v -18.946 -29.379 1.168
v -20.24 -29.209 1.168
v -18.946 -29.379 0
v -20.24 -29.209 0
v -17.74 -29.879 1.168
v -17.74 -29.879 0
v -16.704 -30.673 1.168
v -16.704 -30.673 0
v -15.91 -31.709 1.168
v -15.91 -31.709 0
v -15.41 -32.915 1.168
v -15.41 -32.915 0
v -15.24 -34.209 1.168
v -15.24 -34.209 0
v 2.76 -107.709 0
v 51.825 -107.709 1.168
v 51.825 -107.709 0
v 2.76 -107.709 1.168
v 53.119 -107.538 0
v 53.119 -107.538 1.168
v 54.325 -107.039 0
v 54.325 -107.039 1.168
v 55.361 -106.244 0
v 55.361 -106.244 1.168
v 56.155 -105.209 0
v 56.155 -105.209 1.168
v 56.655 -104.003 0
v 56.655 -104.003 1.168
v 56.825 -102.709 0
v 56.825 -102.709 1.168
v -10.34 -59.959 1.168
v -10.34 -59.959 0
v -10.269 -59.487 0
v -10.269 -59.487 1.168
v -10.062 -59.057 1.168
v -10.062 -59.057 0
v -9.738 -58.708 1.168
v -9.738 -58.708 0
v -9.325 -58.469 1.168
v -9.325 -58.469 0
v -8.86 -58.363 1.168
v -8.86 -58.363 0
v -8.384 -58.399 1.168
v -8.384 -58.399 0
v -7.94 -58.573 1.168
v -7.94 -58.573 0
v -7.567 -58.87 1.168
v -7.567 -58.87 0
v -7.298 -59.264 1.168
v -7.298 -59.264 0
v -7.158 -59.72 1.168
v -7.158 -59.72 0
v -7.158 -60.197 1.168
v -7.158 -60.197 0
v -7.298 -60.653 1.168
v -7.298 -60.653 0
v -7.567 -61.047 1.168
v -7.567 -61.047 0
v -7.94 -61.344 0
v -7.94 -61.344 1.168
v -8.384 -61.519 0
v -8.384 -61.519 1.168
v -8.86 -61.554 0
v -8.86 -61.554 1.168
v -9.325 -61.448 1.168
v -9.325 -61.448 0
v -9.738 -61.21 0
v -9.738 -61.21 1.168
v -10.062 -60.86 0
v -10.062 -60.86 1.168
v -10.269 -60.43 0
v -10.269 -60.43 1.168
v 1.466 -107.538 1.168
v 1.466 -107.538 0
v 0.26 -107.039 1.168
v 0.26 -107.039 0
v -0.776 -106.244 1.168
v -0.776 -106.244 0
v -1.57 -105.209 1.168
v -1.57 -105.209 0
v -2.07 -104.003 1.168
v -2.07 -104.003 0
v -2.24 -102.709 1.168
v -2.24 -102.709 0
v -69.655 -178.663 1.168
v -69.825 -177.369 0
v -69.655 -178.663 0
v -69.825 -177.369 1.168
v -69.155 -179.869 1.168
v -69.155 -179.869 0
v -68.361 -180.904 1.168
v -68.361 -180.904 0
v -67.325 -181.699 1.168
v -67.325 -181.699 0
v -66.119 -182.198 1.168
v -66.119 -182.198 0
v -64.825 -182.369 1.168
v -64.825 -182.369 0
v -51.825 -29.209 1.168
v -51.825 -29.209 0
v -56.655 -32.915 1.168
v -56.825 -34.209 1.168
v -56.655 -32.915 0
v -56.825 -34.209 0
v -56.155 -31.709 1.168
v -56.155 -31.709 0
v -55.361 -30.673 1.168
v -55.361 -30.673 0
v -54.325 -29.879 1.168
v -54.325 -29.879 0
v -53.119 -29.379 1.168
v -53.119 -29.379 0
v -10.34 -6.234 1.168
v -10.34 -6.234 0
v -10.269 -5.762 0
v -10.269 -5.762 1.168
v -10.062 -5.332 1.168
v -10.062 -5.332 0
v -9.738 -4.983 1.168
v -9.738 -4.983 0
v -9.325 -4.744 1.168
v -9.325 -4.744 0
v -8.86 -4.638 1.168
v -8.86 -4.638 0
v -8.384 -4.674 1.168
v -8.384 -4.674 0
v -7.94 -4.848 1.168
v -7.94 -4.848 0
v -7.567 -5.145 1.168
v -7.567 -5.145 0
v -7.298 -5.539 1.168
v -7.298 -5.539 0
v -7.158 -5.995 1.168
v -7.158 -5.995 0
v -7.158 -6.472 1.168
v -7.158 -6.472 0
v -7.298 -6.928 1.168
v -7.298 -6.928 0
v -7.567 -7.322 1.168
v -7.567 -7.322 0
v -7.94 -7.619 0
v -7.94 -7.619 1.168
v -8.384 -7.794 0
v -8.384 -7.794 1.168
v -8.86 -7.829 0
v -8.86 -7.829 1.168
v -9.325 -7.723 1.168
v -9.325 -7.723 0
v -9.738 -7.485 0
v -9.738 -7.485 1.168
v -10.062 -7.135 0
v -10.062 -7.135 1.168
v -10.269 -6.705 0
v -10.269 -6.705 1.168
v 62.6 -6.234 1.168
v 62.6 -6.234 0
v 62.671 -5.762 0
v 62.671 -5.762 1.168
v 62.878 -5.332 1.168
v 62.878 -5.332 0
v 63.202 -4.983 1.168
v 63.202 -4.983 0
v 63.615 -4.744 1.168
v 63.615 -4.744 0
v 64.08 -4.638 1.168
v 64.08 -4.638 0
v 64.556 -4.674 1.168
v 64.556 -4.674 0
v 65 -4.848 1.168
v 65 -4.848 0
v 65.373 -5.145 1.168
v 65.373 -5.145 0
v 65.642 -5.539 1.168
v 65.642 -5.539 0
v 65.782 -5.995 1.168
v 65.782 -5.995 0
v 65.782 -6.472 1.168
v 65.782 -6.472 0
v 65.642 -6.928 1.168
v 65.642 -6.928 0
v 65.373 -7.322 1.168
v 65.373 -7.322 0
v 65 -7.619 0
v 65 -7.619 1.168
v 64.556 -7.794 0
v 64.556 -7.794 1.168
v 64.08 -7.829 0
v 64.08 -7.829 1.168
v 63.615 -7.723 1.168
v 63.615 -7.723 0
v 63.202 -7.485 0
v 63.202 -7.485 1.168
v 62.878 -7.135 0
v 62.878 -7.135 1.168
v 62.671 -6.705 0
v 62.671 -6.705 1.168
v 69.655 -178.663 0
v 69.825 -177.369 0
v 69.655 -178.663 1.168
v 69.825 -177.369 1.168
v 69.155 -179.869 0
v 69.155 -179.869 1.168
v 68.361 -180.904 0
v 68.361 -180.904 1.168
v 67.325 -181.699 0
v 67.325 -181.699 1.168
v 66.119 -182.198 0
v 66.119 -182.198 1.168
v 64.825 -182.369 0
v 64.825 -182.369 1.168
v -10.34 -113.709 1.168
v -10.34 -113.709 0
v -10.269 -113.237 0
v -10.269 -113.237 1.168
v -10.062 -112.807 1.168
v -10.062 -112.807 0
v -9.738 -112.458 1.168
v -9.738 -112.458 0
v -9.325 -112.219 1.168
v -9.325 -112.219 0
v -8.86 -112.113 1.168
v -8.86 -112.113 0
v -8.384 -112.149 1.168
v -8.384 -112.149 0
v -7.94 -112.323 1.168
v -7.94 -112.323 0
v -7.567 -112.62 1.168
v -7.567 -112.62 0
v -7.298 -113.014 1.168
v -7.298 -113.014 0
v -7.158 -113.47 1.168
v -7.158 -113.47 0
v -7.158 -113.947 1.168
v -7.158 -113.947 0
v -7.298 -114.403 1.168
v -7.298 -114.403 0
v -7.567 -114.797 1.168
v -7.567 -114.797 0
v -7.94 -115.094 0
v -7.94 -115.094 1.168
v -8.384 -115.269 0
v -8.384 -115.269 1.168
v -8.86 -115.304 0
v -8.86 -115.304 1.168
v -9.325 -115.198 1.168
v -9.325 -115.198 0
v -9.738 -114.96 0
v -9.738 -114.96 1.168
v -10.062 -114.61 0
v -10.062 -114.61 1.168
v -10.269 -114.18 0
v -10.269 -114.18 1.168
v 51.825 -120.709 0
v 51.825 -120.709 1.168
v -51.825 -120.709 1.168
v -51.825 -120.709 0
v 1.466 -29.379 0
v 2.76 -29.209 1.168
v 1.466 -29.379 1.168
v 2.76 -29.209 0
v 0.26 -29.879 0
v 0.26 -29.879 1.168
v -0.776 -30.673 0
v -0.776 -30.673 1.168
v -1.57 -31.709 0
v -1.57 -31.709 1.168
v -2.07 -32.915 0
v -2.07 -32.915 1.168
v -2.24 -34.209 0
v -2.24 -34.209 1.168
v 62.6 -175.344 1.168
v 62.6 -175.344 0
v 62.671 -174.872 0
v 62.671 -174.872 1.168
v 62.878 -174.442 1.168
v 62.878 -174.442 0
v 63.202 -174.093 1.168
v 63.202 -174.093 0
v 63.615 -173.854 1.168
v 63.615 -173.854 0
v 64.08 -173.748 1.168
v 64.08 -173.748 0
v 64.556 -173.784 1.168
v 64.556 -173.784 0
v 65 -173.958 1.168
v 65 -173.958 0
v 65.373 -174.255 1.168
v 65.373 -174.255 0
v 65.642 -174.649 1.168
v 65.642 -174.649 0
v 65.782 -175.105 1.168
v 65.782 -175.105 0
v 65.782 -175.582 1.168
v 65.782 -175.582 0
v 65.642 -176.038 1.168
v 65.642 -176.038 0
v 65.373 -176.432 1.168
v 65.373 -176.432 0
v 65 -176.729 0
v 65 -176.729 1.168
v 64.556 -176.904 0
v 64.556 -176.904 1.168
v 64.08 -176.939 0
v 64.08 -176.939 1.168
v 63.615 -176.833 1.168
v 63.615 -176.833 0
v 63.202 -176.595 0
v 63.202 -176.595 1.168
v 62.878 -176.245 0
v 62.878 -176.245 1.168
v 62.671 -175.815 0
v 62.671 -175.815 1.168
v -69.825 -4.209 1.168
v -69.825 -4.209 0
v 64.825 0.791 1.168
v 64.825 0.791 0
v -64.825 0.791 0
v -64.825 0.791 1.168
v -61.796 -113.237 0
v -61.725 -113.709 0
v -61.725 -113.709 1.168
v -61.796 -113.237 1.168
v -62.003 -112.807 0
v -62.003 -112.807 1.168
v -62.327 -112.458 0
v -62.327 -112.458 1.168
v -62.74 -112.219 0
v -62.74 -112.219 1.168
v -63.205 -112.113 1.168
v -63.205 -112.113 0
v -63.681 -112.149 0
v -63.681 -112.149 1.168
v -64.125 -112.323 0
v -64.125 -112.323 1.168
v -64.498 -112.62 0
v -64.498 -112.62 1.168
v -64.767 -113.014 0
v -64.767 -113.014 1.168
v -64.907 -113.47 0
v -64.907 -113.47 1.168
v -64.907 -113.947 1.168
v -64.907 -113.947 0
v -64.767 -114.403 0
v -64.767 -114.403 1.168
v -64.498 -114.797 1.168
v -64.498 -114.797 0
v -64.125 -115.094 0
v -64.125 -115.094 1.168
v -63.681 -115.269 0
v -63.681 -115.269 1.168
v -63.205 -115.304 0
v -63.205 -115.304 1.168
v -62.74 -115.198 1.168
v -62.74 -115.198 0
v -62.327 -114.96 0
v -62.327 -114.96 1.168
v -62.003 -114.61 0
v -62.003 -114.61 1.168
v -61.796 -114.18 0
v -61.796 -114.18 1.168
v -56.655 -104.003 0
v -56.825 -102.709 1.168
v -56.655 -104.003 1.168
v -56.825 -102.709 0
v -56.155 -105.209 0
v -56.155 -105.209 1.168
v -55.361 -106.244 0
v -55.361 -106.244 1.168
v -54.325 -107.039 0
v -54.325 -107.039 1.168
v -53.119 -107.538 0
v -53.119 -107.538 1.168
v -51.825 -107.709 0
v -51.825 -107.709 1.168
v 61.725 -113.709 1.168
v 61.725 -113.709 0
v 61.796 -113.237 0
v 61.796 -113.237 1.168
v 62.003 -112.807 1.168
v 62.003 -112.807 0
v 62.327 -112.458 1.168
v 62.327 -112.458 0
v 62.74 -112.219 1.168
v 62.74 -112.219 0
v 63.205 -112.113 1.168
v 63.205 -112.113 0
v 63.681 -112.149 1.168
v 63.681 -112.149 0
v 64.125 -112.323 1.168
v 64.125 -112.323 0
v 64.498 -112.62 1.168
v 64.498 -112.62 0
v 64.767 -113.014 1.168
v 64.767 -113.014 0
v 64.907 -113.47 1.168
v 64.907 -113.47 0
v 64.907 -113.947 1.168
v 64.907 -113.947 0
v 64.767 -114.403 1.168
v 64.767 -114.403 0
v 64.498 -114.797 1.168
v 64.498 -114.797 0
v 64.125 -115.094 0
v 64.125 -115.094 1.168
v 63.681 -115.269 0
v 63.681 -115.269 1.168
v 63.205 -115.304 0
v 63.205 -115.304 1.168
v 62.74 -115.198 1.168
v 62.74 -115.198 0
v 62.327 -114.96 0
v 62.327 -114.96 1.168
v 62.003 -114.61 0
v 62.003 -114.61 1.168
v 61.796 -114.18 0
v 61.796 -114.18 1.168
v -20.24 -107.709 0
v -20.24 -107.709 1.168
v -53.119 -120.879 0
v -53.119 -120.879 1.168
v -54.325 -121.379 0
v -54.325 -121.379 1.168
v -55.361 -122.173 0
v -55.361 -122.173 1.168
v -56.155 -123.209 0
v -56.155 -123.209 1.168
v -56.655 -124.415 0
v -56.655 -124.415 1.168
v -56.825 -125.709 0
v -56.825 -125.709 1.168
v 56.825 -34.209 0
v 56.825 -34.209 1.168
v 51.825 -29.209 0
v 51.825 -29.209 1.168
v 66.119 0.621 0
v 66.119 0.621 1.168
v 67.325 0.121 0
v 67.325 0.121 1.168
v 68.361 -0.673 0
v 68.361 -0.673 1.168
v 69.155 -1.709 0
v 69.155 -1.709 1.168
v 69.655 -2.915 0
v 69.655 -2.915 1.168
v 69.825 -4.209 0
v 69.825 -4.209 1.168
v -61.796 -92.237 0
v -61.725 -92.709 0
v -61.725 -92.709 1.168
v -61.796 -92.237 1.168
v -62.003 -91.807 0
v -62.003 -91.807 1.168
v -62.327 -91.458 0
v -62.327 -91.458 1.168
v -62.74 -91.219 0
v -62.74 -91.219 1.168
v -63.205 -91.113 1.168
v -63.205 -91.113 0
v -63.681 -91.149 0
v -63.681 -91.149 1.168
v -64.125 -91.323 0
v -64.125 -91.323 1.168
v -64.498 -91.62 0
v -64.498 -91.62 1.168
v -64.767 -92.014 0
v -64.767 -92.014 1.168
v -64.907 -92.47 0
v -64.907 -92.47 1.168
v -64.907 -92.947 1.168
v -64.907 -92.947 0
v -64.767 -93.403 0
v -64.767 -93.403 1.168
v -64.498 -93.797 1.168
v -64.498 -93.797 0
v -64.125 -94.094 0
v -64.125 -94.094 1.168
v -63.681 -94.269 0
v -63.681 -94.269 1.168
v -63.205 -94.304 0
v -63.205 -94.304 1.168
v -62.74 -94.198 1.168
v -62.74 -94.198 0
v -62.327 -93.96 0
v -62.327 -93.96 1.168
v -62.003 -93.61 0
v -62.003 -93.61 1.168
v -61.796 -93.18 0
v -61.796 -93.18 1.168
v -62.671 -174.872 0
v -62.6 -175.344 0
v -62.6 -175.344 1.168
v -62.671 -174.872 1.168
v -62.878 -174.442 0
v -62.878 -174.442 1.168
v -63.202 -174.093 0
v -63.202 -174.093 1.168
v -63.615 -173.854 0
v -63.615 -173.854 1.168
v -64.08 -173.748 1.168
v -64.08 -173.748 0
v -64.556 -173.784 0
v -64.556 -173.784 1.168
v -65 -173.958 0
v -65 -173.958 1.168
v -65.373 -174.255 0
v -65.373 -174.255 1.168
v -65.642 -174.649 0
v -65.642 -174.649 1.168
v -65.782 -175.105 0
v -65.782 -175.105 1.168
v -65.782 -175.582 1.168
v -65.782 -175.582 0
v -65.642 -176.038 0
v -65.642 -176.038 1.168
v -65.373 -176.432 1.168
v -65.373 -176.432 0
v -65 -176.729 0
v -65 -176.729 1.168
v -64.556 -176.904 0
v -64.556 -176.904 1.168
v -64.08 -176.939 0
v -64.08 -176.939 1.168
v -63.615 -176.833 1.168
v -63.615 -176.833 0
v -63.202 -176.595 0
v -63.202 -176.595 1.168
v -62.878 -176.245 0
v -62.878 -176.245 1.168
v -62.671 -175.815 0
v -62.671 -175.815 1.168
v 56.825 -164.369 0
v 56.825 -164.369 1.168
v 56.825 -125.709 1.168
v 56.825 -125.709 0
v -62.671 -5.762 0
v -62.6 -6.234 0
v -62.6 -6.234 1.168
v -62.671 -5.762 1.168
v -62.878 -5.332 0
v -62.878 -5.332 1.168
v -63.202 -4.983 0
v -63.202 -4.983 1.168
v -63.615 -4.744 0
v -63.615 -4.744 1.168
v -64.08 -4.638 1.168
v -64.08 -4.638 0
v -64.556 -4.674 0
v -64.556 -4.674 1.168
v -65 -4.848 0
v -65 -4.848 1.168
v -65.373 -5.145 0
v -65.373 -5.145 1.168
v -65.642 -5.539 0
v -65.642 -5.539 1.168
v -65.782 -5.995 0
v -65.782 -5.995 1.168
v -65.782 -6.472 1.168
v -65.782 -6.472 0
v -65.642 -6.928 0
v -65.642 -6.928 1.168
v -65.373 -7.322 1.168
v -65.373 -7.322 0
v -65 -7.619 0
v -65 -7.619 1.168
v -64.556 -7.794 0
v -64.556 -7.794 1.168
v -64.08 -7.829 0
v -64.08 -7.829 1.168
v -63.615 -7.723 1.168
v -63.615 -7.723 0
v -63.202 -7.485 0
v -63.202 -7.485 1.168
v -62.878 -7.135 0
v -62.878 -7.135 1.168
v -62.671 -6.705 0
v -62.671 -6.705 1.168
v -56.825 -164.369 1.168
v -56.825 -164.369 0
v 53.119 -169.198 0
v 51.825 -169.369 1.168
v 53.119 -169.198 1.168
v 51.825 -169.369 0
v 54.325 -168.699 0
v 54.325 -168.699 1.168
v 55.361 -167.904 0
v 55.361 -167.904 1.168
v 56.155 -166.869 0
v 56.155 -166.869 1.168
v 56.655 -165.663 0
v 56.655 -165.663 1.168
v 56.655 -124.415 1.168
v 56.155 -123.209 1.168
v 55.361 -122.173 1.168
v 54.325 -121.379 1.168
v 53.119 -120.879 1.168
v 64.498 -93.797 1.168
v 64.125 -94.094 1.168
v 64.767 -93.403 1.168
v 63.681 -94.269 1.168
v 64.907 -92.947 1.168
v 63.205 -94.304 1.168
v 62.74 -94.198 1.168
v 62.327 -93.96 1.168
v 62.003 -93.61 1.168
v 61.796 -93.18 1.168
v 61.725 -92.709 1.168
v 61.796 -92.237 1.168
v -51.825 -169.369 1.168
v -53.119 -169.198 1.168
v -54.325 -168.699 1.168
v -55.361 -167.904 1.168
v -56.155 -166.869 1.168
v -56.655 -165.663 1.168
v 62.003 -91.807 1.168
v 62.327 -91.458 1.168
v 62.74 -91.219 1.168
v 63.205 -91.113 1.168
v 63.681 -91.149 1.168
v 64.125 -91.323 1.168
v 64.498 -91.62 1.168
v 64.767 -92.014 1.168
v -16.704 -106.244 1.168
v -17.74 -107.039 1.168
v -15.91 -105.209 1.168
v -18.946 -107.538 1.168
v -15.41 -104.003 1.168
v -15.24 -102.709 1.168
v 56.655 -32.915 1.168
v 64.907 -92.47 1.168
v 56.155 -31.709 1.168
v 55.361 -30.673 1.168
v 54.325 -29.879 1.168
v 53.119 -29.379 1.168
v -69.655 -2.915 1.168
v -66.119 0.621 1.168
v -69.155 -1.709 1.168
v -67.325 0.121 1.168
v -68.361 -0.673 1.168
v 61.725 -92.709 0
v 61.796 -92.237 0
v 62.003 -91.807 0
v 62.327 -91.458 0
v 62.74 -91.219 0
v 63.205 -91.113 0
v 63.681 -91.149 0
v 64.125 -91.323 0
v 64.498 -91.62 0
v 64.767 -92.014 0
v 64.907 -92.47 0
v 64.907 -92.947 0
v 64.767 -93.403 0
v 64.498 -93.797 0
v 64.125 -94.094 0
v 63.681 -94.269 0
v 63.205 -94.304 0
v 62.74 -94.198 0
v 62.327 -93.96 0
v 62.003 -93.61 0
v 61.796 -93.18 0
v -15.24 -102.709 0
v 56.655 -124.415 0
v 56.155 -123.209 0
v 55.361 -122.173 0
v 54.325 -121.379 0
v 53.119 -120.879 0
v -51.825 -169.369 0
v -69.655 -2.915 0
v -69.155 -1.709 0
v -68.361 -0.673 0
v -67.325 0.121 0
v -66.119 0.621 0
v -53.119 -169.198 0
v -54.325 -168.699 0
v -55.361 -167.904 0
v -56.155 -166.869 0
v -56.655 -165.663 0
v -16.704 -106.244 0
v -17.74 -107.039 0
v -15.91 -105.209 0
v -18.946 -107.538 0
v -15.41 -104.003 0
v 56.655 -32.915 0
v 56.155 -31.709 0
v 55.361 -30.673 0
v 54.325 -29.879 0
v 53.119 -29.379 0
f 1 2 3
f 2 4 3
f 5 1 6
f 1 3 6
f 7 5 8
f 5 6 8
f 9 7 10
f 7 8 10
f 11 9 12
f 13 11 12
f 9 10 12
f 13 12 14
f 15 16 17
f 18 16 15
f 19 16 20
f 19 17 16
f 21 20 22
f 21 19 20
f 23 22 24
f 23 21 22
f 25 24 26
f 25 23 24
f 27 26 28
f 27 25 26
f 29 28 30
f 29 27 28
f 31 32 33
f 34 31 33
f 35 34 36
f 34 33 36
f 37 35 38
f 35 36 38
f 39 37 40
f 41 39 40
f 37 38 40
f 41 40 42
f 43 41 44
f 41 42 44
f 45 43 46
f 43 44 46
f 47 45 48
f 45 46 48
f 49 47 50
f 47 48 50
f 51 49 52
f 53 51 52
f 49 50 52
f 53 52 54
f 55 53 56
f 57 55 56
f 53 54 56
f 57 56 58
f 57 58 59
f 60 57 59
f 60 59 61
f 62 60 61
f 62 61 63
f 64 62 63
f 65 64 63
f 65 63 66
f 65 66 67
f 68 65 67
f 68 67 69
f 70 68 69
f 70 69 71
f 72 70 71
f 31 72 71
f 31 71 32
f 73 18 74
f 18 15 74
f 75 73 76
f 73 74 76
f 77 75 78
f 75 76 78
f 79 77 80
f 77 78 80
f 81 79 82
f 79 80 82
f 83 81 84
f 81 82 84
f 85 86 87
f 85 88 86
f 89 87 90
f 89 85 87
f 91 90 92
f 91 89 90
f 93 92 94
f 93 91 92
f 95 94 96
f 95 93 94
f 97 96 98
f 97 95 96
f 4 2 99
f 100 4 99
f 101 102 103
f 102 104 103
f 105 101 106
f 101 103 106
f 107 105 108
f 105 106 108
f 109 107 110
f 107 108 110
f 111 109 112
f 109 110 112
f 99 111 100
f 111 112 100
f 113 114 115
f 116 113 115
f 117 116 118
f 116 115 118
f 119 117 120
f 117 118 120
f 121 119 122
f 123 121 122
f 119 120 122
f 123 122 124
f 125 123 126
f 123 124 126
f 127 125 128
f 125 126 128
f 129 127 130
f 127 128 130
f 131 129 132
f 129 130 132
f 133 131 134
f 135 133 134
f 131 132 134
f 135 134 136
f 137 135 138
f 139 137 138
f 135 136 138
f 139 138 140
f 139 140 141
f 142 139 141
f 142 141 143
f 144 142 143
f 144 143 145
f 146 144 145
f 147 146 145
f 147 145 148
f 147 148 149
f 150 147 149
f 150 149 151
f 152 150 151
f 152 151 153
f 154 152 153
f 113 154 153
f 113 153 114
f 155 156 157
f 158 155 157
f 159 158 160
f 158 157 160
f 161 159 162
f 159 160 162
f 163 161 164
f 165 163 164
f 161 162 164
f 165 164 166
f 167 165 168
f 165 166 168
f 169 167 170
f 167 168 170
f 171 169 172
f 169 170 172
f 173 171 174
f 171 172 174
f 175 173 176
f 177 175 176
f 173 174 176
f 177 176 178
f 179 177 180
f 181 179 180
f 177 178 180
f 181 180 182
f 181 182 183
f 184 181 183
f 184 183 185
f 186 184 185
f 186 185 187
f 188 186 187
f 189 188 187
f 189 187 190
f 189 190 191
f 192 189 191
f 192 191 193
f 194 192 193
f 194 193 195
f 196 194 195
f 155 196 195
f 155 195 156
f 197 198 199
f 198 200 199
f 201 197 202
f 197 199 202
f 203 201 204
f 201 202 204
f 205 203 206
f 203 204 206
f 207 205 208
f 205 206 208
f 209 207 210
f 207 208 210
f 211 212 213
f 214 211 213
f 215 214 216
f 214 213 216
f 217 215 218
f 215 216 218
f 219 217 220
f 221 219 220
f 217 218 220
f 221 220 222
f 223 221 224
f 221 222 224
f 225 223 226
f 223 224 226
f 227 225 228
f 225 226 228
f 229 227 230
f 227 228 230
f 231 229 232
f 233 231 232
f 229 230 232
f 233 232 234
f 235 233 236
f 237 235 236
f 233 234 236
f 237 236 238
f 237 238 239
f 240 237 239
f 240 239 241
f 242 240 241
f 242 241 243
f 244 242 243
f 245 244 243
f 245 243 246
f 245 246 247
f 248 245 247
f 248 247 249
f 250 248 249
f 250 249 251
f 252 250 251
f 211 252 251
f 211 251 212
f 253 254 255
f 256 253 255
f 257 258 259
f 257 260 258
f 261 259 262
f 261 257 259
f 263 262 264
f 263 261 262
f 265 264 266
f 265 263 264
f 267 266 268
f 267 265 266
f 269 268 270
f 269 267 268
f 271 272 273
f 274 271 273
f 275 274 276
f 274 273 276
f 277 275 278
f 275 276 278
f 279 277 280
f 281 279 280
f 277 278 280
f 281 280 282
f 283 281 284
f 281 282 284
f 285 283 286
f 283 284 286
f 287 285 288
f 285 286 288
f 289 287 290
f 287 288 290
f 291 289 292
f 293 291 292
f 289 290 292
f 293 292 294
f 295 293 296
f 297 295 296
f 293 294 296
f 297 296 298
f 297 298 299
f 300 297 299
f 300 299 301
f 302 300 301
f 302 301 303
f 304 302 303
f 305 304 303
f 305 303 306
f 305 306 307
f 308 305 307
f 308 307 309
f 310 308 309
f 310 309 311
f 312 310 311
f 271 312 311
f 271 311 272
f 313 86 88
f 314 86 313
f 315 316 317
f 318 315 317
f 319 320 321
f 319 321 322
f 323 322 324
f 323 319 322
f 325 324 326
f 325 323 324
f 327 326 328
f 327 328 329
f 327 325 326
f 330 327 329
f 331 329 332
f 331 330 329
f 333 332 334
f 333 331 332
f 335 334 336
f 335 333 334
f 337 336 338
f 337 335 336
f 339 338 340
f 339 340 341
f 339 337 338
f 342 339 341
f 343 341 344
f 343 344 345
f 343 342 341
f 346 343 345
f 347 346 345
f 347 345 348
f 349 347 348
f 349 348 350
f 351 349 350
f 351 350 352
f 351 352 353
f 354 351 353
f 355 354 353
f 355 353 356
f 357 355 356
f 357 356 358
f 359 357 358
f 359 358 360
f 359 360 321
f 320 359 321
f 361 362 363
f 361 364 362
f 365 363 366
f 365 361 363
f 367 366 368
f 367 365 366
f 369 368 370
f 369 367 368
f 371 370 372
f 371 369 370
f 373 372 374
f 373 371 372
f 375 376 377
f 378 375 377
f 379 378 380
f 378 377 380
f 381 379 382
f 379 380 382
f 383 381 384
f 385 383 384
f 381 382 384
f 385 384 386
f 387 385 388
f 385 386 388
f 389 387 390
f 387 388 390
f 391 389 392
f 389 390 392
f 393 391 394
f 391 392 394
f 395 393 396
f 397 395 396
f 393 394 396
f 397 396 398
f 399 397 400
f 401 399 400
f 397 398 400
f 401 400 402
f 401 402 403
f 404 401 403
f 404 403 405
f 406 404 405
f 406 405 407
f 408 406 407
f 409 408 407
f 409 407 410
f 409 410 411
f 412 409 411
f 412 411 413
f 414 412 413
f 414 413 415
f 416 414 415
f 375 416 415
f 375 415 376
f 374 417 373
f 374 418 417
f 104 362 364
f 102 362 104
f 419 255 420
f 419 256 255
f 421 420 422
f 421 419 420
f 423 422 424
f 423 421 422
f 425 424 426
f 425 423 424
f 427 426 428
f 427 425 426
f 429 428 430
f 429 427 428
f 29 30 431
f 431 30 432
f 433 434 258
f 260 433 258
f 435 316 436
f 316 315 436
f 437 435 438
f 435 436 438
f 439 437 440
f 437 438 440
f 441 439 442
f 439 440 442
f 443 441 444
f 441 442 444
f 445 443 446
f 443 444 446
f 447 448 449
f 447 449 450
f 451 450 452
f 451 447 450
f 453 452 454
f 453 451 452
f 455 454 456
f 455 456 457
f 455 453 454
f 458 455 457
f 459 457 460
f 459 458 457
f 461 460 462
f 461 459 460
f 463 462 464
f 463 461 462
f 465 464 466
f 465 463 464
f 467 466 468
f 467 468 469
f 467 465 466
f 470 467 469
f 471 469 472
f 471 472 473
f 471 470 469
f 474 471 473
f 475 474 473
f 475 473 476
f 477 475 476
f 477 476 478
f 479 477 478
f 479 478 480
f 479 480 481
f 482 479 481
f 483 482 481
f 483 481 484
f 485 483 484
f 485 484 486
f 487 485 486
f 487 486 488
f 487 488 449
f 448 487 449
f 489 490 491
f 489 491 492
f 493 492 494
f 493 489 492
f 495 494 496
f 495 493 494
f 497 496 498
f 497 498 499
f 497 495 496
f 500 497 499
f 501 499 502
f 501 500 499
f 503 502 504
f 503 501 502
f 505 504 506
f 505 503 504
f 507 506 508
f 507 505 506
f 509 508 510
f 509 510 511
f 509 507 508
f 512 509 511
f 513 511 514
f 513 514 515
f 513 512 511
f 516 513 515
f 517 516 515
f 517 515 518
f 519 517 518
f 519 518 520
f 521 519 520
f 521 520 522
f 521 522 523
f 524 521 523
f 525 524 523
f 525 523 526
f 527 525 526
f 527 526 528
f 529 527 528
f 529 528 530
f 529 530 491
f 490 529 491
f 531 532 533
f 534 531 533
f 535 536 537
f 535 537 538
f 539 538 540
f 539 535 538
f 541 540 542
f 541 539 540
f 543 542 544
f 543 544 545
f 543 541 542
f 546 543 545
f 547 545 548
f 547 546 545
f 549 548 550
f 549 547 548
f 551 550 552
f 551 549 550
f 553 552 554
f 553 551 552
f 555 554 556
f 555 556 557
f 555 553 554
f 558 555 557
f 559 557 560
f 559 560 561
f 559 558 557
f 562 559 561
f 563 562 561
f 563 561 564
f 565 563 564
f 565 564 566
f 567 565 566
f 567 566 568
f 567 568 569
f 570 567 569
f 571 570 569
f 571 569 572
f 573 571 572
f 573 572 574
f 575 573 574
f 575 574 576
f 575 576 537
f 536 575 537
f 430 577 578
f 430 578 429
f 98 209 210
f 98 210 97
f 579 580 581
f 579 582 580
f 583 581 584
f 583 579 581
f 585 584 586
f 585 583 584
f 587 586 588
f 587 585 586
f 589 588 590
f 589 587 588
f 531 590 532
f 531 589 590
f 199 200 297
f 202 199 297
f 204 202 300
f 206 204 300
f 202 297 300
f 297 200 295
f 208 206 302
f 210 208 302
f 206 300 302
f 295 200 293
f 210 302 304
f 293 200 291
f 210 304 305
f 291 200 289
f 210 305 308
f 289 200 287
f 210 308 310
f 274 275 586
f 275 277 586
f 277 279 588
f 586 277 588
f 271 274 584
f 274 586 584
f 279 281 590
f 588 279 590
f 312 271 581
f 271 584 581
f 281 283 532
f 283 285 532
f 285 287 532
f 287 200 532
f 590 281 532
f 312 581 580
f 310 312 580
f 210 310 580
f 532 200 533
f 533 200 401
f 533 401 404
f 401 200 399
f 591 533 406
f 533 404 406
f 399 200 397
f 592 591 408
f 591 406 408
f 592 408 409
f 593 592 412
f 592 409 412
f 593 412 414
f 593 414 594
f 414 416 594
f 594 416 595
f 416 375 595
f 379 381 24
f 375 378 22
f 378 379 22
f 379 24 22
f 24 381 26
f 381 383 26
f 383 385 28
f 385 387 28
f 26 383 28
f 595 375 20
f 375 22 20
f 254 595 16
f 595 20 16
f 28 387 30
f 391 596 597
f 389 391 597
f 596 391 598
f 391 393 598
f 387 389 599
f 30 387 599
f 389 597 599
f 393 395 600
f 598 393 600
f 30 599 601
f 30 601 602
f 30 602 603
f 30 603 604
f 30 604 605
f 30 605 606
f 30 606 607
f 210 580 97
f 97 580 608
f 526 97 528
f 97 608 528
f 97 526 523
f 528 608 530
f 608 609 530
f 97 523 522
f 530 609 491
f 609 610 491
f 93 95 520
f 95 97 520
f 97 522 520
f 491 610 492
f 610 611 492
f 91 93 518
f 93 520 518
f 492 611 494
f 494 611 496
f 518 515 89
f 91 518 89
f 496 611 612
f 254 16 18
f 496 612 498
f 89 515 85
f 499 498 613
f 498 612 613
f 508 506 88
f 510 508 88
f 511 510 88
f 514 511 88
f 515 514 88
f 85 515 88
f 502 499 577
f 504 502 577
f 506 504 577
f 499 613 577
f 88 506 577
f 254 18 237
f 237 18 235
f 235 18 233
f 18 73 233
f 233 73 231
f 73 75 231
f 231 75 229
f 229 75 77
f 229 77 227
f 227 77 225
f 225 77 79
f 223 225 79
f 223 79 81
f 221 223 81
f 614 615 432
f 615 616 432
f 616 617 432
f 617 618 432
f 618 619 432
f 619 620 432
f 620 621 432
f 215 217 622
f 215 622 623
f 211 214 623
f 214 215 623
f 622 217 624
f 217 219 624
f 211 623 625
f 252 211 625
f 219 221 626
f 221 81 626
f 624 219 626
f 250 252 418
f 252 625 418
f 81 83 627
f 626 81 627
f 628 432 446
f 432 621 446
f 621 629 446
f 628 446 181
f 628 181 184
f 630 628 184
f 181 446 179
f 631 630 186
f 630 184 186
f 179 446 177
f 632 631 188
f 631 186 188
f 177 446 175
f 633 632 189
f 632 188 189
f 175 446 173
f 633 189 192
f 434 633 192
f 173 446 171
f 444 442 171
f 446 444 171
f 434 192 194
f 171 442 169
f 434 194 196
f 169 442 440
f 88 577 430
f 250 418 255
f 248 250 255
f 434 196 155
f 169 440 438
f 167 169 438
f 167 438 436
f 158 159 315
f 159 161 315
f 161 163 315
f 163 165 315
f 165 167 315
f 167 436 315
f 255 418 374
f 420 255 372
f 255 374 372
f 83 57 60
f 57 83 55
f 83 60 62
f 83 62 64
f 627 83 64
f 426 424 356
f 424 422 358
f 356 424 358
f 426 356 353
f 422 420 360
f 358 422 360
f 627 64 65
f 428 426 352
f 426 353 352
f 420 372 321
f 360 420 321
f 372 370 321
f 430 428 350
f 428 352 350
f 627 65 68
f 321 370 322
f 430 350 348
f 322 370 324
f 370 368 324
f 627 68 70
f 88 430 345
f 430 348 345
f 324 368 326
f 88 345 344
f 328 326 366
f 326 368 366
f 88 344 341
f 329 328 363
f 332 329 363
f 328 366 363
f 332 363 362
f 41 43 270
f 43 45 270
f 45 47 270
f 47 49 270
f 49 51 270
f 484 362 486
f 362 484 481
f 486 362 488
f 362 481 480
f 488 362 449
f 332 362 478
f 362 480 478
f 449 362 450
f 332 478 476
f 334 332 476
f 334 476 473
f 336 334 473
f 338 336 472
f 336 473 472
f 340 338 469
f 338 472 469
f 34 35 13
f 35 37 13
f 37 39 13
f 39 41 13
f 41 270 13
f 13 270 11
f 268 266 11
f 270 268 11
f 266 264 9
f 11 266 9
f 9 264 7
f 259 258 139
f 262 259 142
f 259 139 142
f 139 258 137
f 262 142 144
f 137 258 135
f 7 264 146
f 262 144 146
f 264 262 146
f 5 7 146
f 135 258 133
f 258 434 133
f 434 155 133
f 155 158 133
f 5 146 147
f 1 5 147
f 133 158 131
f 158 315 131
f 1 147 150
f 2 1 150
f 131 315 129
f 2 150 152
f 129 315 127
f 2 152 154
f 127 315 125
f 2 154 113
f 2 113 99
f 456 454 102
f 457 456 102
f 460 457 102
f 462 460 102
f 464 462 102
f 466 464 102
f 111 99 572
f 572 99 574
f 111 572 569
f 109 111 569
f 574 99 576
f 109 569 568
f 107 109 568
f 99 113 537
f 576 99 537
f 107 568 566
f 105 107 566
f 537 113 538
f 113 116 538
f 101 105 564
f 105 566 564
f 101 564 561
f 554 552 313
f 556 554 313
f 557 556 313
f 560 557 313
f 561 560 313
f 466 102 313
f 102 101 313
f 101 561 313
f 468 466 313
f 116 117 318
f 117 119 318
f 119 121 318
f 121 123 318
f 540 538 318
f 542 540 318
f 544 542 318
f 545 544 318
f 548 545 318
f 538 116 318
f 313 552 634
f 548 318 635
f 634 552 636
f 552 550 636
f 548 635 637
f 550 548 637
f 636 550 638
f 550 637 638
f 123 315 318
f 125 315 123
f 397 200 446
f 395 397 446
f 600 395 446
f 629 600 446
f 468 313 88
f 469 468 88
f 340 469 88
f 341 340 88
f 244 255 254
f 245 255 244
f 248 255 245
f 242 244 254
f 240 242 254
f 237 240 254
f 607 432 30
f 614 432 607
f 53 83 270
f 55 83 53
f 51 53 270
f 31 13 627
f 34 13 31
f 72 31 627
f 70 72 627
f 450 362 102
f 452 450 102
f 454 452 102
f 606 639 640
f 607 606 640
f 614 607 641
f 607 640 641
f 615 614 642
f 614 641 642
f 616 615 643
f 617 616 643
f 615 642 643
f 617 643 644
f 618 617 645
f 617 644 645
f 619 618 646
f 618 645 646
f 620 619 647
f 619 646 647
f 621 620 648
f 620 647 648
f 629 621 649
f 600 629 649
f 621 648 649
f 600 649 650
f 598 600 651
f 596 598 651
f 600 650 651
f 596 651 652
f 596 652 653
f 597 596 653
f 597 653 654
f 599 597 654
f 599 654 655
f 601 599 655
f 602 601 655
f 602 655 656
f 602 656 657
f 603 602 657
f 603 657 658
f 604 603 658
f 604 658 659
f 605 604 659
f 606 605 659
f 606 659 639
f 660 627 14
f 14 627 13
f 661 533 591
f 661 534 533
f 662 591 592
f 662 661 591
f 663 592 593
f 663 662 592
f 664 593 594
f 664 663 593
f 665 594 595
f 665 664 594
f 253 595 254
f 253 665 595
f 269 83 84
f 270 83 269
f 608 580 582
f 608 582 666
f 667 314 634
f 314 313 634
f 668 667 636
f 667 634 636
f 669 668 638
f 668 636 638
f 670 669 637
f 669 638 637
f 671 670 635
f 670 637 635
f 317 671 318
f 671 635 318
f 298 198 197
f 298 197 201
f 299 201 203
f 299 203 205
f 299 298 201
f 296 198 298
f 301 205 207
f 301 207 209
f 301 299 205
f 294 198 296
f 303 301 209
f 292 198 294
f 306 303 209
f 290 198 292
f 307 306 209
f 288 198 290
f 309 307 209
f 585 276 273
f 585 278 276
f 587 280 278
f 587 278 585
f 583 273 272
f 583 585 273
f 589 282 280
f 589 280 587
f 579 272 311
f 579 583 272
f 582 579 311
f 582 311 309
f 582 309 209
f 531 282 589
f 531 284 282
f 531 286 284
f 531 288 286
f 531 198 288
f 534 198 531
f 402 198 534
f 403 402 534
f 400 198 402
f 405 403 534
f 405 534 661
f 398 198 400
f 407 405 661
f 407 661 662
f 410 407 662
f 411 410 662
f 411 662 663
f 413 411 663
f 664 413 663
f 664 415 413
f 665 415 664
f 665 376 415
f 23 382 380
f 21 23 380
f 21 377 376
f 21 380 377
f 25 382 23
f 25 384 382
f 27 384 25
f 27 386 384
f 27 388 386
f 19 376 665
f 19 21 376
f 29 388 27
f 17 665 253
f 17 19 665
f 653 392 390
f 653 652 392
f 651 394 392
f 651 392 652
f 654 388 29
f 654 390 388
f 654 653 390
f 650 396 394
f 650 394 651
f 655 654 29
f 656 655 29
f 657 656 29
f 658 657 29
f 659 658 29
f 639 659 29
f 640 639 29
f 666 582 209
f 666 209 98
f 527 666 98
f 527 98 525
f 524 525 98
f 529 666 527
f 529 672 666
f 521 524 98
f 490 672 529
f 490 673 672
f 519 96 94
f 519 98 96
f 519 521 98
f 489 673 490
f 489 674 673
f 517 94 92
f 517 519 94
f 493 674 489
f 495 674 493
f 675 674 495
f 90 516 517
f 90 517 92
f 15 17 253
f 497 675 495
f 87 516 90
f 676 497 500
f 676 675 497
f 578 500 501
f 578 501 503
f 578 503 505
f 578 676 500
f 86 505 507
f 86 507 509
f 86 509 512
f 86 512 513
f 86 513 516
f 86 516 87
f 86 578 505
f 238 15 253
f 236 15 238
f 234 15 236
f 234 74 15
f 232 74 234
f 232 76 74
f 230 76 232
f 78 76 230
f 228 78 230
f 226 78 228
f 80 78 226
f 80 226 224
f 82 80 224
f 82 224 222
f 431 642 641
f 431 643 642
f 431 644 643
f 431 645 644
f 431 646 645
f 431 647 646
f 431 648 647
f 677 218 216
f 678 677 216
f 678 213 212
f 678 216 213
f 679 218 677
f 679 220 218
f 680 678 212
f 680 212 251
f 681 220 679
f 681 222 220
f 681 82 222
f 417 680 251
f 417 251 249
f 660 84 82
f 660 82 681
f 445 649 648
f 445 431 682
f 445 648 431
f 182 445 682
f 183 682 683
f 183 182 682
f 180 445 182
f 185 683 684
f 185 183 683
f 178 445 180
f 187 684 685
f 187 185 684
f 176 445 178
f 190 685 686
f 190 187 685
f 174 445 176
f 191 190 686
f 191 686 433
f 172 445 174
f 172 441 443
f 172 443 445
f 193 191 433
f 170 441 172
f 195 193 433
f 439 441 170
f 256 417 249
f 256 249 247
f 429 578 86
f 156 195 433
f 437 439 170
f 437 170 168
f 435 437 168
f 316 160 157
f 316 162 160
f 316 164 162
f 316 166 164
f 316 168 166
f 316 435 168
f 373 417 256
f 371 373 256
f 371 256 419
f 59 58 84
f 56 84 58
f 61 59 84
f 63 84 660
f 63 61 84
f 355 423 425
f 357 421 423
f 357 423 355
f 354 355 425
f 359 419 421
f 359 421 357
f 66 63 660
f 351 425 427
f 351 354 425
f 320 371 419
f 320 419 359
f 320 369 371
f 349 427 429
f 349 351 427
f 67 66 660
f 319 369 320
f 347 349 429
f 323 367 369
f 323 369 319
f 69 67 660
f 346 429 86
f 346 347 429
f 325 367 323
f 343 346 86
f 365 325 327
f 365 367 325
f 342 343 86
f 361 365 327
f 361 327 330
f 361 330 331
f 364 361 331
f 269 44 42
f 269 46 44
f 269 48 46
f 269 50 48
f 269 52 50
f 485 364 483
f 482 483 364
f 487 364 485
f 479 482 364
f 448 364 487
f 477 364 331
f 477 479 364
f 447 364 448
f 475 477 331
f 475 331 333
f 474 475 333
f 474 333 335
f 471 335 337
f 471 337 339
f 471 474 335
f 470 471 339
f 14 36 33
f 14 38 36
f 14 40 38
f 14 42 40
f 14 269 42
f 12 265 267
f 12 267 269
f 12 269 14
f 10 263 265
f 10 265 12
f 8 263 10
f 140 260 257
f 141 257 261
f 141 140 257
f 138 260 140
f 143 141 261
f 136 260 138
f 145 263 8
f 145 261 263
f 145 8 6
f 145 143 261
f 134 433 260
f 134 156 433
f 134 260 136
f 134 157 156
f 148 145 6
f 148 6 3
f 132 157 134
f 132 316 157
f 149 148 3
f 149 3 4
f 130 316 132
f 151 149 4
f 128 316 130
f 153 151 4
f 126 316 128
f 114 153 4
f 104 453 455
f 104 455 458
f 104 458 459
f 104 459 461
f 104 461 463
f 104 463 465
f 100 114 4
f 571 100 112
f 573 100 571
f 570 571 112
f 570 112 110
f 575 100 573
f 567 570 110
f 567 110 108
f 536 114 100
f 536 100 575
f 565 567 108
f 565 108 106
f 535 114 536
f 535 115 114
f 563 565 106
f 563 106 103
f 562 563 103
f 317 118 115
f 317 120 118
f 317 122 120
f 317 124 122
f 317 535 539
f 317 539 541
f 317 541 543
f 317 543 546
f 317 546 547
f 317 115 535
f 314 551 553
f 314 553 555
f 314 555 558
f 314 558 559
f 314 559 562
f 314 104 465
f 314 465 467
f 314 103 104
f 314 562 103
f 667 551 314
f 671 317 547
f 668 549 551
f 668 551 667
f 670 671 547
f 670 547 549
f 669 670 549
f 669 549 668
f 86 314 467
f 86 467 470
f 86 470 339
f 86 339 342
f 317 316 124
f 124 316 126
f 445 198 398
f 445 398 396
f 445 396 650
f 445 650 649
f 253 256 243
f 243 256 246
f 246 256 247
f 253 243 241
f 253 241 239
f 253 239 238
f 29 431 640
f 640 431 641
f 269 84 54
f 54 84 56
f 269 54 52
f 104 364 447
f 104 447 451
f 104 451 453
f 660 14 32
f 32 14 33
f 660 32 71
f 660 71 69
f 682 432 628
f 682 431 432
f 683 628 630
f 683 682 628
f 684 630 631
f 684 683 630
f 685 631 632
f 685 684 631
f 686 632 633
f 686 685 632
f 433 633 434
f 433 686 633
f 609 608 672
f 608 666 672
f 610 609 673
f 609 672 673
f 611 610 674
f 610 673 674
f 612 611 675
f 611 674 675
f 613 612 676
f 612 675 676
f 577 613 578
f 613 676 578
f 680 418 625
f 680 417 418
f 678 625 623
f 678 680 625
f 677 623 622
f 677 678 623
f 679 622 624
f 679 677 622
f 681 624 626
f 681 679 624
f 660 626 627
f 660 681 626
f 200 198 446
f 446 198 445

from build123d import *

# Parameters (mm, degrees)
SKETCH1_W                = 69.825
SKETCH1_H                = 183.16
FRONT_PLATE_DEPTH        = 1.2
CUT_EXTRUDE1_REACH       = 197.283
SKETCH3_W                = 56.825
SKETCH3_H                = 78.5
SKETCH3_H_2              = 48.66
CONVERT_SOLID5_START     = 1.1684
CONVERT_SOLID5_DEPTH     = 0.0316
M3_CLEARANCE_HOLE1_D     = 3.2
M3_CLEARANCE_HOLE1_DEPTH = 5
M3_CLEARANCE_HOLE1_TIP   = 0.96137699
SKETCH62_W               = 13
SKETCH62_H               = 78.5
BOSS_EXTRUDE2_DEPTH      = 1.1684
FILLET1_R                = 5
M3_CLEARANCE_HOLE2_D     = 3.2
M3_CLEARANCE_HOLE2_DEPTH = 5
M3_CLEARANCE_HOLE2_TIP   = 0.96137699


# Read off the part's stored shape, not the designer's step: Convert-Solid5
with BuildPart() as part:
    # Sketch1 → front_plate (new body)
    with BuildSketch(Plane.XY):
        with Locations((34.9125, -90.788691865)):
            Rectangle(SKETCH1_W, SKETCH1_H)
    extrude(amount=FRONT_PLATE_DEPTH)

    # Sketch3 → Cut-Extrude1 (cut, up to next)
    with BuildSketch(Plane.XY.offset(1.2), mode=Mode.PRIVATE) as cut_extrude1_sk1:
        with Locations((28.4125, -68.458691865)):
            Rectangle(SKETCH3_W, SKETCH3_H)
    cut_extrude1_tool1 = extrude(cut_extrude1_sk1.sketch, amount=-CUT_EXTRUDE1_REACH, mode=Mode.PRIVATE) & part.part
    # Sketch3 → Cut-Extrude1 (cut, up to next)
    with BuildSketch(Plane.XY.offset(1.2), mode=Mode.PRIVATE) as cut_extrude1_sk2:
        with Locations((28.4125, -145.038691865)):
            Rectangle(SKETCH3_W, SKETCH3_H_2)
    cut_extrude1_tool2 = extrude(cut_extrude1_sk2.sketch, amount=-CUT_EXTRUDE1_REACH, mode=Mode.PRIVATE) & part.part
    add(cut_extrude1_tool1.solids().sort_by_distance((28.4125, -68.458692, 1.2))[0], mode=Mode.SUBTRACT)
    add(cut_extrude1_tool2.solids().sort_by_distance((28.4125, -145.038692, 1.2))[0], mode=Mode.SUBTRACT)

    # Convert-Solid5 outline → Convert-Solid5 (cut)
    with BuildSketch(Plane.XY.offset(CONVERT_SOLID5_START)):
        Polygon((56.825, -107.708691865), (0, -107.708691865), (0, -120.708691865), (56.825, -120.708691865), (56.825, -169.368691865), (0, -169.368691865), (0, -182.368691865), (69.825, -182.368691865), (69.825, 0.791308135), (0, 0.791308135), (0, -29.208691865), (56.825, -29.208691865), align=None)
    extrude(amount=CONVERT_SOLID5_DEPTH, mode=Mode.SUBTRACT)

    # M3 Clearance Hole1
    with Locations(Plane.XY.offset(1.1684)):
        with Locations((63.325, -92.708691865), (63.325, -113.708691865), (64.2, -6.233691865), (64.2, -175.343691865)):
            Hole(M3_CLEARANCE_HOLE1_D / 2, depth=M3_CLEARANCE_HOLE1_DEPTH)
            with Locations((0, 0, -(M3_CLEARANCE_HOLE1_DEPTH + M3_CLEARANCE_HOLE1_TIP / 2))):  # 118° drill point
                Cone(0, M3_CLEARANCE_HOLE1_D / 2, M3_CLEARANCE_HOLE1_TIP, mode=Mode.SUBTRACT)

    # Mirror2: part across plane


with BuildPart() as part_1:
    add(part.part)
    add(part.part.mirror(Plane(origin=(0, 0.791308135, 0), x_dir=(0, 0, 1), z_dir=(-1, 0, 0))))

    # Sketch62 → Boss-Extrude2 (add)
    with BuildSketch(Plane.XY.offset(1.1684)):
        with Locations((-8.74, -68.458691865)):
            Rectangle(SKETCH62_W, SKETCH62_H)
    extrude(amount=-BOSS_EXTRUDE2_DEPTH)

    # Fillet1
    fillet1_edges = [part_1.edges().sort_by_distance(p)[0] for p in [
        (-15.24, -107.708691865, 0.5842),
        (-15.24, -29.208691865, 0.5842),
        (-2.24, -29.208691865, 0.5842),
        (-2.24, -107.708691865, 0.5842),
        (56.825, -120.708691865, 0.5842),
        (56.825, -169.368691865, 0.5842),
        (69.825, -182.368691865, 0.5842),
        (69.825, 0.791308135, 0.5842),
        (56.825, -29.208691865, 0.5842),
        (56.825, -107.708691865, 0.5842),
        (-56.825, -107.708691865, 0.5842),
        (-56.825, -29.208691865, 0.5842),
        (-69.825, 0.791308135, 0.5842),
        (-69.825, -182.368691865, 0.5842),
        (-56.825, -169.368691865, 0.5842),
        (-56.825, -120.708691865, 0.5842),
    ]]
    fillet(fillet1_edges, radius=FILLET1_R)

    # M3 Clearance Hole2
    with Locations(Plane.XY.offset(1.1684)):
        with Locations((-8.74, -6.233691865), (-8.74, -59.958691865), (-8.74, -113.708691865)):
            Hole(M3_CLEARANCE_HOLE2_D / 2, depth=M3_CLEARANCE_HOLE2_DEPTH)
            with Locations((0, 0, -(M3_CLEARANCE_HOLE2_DEPTH + M3_CLEARANCE_HOLE2_TIP / 2))):  # 118° drill point
                Cone(0, M3_CLEARANCE_HOLE2_D / 2, M3_CLEARANCE_HOLE2_TIP, mode=Mode.SUBTRACT)


solid = part_1.part
